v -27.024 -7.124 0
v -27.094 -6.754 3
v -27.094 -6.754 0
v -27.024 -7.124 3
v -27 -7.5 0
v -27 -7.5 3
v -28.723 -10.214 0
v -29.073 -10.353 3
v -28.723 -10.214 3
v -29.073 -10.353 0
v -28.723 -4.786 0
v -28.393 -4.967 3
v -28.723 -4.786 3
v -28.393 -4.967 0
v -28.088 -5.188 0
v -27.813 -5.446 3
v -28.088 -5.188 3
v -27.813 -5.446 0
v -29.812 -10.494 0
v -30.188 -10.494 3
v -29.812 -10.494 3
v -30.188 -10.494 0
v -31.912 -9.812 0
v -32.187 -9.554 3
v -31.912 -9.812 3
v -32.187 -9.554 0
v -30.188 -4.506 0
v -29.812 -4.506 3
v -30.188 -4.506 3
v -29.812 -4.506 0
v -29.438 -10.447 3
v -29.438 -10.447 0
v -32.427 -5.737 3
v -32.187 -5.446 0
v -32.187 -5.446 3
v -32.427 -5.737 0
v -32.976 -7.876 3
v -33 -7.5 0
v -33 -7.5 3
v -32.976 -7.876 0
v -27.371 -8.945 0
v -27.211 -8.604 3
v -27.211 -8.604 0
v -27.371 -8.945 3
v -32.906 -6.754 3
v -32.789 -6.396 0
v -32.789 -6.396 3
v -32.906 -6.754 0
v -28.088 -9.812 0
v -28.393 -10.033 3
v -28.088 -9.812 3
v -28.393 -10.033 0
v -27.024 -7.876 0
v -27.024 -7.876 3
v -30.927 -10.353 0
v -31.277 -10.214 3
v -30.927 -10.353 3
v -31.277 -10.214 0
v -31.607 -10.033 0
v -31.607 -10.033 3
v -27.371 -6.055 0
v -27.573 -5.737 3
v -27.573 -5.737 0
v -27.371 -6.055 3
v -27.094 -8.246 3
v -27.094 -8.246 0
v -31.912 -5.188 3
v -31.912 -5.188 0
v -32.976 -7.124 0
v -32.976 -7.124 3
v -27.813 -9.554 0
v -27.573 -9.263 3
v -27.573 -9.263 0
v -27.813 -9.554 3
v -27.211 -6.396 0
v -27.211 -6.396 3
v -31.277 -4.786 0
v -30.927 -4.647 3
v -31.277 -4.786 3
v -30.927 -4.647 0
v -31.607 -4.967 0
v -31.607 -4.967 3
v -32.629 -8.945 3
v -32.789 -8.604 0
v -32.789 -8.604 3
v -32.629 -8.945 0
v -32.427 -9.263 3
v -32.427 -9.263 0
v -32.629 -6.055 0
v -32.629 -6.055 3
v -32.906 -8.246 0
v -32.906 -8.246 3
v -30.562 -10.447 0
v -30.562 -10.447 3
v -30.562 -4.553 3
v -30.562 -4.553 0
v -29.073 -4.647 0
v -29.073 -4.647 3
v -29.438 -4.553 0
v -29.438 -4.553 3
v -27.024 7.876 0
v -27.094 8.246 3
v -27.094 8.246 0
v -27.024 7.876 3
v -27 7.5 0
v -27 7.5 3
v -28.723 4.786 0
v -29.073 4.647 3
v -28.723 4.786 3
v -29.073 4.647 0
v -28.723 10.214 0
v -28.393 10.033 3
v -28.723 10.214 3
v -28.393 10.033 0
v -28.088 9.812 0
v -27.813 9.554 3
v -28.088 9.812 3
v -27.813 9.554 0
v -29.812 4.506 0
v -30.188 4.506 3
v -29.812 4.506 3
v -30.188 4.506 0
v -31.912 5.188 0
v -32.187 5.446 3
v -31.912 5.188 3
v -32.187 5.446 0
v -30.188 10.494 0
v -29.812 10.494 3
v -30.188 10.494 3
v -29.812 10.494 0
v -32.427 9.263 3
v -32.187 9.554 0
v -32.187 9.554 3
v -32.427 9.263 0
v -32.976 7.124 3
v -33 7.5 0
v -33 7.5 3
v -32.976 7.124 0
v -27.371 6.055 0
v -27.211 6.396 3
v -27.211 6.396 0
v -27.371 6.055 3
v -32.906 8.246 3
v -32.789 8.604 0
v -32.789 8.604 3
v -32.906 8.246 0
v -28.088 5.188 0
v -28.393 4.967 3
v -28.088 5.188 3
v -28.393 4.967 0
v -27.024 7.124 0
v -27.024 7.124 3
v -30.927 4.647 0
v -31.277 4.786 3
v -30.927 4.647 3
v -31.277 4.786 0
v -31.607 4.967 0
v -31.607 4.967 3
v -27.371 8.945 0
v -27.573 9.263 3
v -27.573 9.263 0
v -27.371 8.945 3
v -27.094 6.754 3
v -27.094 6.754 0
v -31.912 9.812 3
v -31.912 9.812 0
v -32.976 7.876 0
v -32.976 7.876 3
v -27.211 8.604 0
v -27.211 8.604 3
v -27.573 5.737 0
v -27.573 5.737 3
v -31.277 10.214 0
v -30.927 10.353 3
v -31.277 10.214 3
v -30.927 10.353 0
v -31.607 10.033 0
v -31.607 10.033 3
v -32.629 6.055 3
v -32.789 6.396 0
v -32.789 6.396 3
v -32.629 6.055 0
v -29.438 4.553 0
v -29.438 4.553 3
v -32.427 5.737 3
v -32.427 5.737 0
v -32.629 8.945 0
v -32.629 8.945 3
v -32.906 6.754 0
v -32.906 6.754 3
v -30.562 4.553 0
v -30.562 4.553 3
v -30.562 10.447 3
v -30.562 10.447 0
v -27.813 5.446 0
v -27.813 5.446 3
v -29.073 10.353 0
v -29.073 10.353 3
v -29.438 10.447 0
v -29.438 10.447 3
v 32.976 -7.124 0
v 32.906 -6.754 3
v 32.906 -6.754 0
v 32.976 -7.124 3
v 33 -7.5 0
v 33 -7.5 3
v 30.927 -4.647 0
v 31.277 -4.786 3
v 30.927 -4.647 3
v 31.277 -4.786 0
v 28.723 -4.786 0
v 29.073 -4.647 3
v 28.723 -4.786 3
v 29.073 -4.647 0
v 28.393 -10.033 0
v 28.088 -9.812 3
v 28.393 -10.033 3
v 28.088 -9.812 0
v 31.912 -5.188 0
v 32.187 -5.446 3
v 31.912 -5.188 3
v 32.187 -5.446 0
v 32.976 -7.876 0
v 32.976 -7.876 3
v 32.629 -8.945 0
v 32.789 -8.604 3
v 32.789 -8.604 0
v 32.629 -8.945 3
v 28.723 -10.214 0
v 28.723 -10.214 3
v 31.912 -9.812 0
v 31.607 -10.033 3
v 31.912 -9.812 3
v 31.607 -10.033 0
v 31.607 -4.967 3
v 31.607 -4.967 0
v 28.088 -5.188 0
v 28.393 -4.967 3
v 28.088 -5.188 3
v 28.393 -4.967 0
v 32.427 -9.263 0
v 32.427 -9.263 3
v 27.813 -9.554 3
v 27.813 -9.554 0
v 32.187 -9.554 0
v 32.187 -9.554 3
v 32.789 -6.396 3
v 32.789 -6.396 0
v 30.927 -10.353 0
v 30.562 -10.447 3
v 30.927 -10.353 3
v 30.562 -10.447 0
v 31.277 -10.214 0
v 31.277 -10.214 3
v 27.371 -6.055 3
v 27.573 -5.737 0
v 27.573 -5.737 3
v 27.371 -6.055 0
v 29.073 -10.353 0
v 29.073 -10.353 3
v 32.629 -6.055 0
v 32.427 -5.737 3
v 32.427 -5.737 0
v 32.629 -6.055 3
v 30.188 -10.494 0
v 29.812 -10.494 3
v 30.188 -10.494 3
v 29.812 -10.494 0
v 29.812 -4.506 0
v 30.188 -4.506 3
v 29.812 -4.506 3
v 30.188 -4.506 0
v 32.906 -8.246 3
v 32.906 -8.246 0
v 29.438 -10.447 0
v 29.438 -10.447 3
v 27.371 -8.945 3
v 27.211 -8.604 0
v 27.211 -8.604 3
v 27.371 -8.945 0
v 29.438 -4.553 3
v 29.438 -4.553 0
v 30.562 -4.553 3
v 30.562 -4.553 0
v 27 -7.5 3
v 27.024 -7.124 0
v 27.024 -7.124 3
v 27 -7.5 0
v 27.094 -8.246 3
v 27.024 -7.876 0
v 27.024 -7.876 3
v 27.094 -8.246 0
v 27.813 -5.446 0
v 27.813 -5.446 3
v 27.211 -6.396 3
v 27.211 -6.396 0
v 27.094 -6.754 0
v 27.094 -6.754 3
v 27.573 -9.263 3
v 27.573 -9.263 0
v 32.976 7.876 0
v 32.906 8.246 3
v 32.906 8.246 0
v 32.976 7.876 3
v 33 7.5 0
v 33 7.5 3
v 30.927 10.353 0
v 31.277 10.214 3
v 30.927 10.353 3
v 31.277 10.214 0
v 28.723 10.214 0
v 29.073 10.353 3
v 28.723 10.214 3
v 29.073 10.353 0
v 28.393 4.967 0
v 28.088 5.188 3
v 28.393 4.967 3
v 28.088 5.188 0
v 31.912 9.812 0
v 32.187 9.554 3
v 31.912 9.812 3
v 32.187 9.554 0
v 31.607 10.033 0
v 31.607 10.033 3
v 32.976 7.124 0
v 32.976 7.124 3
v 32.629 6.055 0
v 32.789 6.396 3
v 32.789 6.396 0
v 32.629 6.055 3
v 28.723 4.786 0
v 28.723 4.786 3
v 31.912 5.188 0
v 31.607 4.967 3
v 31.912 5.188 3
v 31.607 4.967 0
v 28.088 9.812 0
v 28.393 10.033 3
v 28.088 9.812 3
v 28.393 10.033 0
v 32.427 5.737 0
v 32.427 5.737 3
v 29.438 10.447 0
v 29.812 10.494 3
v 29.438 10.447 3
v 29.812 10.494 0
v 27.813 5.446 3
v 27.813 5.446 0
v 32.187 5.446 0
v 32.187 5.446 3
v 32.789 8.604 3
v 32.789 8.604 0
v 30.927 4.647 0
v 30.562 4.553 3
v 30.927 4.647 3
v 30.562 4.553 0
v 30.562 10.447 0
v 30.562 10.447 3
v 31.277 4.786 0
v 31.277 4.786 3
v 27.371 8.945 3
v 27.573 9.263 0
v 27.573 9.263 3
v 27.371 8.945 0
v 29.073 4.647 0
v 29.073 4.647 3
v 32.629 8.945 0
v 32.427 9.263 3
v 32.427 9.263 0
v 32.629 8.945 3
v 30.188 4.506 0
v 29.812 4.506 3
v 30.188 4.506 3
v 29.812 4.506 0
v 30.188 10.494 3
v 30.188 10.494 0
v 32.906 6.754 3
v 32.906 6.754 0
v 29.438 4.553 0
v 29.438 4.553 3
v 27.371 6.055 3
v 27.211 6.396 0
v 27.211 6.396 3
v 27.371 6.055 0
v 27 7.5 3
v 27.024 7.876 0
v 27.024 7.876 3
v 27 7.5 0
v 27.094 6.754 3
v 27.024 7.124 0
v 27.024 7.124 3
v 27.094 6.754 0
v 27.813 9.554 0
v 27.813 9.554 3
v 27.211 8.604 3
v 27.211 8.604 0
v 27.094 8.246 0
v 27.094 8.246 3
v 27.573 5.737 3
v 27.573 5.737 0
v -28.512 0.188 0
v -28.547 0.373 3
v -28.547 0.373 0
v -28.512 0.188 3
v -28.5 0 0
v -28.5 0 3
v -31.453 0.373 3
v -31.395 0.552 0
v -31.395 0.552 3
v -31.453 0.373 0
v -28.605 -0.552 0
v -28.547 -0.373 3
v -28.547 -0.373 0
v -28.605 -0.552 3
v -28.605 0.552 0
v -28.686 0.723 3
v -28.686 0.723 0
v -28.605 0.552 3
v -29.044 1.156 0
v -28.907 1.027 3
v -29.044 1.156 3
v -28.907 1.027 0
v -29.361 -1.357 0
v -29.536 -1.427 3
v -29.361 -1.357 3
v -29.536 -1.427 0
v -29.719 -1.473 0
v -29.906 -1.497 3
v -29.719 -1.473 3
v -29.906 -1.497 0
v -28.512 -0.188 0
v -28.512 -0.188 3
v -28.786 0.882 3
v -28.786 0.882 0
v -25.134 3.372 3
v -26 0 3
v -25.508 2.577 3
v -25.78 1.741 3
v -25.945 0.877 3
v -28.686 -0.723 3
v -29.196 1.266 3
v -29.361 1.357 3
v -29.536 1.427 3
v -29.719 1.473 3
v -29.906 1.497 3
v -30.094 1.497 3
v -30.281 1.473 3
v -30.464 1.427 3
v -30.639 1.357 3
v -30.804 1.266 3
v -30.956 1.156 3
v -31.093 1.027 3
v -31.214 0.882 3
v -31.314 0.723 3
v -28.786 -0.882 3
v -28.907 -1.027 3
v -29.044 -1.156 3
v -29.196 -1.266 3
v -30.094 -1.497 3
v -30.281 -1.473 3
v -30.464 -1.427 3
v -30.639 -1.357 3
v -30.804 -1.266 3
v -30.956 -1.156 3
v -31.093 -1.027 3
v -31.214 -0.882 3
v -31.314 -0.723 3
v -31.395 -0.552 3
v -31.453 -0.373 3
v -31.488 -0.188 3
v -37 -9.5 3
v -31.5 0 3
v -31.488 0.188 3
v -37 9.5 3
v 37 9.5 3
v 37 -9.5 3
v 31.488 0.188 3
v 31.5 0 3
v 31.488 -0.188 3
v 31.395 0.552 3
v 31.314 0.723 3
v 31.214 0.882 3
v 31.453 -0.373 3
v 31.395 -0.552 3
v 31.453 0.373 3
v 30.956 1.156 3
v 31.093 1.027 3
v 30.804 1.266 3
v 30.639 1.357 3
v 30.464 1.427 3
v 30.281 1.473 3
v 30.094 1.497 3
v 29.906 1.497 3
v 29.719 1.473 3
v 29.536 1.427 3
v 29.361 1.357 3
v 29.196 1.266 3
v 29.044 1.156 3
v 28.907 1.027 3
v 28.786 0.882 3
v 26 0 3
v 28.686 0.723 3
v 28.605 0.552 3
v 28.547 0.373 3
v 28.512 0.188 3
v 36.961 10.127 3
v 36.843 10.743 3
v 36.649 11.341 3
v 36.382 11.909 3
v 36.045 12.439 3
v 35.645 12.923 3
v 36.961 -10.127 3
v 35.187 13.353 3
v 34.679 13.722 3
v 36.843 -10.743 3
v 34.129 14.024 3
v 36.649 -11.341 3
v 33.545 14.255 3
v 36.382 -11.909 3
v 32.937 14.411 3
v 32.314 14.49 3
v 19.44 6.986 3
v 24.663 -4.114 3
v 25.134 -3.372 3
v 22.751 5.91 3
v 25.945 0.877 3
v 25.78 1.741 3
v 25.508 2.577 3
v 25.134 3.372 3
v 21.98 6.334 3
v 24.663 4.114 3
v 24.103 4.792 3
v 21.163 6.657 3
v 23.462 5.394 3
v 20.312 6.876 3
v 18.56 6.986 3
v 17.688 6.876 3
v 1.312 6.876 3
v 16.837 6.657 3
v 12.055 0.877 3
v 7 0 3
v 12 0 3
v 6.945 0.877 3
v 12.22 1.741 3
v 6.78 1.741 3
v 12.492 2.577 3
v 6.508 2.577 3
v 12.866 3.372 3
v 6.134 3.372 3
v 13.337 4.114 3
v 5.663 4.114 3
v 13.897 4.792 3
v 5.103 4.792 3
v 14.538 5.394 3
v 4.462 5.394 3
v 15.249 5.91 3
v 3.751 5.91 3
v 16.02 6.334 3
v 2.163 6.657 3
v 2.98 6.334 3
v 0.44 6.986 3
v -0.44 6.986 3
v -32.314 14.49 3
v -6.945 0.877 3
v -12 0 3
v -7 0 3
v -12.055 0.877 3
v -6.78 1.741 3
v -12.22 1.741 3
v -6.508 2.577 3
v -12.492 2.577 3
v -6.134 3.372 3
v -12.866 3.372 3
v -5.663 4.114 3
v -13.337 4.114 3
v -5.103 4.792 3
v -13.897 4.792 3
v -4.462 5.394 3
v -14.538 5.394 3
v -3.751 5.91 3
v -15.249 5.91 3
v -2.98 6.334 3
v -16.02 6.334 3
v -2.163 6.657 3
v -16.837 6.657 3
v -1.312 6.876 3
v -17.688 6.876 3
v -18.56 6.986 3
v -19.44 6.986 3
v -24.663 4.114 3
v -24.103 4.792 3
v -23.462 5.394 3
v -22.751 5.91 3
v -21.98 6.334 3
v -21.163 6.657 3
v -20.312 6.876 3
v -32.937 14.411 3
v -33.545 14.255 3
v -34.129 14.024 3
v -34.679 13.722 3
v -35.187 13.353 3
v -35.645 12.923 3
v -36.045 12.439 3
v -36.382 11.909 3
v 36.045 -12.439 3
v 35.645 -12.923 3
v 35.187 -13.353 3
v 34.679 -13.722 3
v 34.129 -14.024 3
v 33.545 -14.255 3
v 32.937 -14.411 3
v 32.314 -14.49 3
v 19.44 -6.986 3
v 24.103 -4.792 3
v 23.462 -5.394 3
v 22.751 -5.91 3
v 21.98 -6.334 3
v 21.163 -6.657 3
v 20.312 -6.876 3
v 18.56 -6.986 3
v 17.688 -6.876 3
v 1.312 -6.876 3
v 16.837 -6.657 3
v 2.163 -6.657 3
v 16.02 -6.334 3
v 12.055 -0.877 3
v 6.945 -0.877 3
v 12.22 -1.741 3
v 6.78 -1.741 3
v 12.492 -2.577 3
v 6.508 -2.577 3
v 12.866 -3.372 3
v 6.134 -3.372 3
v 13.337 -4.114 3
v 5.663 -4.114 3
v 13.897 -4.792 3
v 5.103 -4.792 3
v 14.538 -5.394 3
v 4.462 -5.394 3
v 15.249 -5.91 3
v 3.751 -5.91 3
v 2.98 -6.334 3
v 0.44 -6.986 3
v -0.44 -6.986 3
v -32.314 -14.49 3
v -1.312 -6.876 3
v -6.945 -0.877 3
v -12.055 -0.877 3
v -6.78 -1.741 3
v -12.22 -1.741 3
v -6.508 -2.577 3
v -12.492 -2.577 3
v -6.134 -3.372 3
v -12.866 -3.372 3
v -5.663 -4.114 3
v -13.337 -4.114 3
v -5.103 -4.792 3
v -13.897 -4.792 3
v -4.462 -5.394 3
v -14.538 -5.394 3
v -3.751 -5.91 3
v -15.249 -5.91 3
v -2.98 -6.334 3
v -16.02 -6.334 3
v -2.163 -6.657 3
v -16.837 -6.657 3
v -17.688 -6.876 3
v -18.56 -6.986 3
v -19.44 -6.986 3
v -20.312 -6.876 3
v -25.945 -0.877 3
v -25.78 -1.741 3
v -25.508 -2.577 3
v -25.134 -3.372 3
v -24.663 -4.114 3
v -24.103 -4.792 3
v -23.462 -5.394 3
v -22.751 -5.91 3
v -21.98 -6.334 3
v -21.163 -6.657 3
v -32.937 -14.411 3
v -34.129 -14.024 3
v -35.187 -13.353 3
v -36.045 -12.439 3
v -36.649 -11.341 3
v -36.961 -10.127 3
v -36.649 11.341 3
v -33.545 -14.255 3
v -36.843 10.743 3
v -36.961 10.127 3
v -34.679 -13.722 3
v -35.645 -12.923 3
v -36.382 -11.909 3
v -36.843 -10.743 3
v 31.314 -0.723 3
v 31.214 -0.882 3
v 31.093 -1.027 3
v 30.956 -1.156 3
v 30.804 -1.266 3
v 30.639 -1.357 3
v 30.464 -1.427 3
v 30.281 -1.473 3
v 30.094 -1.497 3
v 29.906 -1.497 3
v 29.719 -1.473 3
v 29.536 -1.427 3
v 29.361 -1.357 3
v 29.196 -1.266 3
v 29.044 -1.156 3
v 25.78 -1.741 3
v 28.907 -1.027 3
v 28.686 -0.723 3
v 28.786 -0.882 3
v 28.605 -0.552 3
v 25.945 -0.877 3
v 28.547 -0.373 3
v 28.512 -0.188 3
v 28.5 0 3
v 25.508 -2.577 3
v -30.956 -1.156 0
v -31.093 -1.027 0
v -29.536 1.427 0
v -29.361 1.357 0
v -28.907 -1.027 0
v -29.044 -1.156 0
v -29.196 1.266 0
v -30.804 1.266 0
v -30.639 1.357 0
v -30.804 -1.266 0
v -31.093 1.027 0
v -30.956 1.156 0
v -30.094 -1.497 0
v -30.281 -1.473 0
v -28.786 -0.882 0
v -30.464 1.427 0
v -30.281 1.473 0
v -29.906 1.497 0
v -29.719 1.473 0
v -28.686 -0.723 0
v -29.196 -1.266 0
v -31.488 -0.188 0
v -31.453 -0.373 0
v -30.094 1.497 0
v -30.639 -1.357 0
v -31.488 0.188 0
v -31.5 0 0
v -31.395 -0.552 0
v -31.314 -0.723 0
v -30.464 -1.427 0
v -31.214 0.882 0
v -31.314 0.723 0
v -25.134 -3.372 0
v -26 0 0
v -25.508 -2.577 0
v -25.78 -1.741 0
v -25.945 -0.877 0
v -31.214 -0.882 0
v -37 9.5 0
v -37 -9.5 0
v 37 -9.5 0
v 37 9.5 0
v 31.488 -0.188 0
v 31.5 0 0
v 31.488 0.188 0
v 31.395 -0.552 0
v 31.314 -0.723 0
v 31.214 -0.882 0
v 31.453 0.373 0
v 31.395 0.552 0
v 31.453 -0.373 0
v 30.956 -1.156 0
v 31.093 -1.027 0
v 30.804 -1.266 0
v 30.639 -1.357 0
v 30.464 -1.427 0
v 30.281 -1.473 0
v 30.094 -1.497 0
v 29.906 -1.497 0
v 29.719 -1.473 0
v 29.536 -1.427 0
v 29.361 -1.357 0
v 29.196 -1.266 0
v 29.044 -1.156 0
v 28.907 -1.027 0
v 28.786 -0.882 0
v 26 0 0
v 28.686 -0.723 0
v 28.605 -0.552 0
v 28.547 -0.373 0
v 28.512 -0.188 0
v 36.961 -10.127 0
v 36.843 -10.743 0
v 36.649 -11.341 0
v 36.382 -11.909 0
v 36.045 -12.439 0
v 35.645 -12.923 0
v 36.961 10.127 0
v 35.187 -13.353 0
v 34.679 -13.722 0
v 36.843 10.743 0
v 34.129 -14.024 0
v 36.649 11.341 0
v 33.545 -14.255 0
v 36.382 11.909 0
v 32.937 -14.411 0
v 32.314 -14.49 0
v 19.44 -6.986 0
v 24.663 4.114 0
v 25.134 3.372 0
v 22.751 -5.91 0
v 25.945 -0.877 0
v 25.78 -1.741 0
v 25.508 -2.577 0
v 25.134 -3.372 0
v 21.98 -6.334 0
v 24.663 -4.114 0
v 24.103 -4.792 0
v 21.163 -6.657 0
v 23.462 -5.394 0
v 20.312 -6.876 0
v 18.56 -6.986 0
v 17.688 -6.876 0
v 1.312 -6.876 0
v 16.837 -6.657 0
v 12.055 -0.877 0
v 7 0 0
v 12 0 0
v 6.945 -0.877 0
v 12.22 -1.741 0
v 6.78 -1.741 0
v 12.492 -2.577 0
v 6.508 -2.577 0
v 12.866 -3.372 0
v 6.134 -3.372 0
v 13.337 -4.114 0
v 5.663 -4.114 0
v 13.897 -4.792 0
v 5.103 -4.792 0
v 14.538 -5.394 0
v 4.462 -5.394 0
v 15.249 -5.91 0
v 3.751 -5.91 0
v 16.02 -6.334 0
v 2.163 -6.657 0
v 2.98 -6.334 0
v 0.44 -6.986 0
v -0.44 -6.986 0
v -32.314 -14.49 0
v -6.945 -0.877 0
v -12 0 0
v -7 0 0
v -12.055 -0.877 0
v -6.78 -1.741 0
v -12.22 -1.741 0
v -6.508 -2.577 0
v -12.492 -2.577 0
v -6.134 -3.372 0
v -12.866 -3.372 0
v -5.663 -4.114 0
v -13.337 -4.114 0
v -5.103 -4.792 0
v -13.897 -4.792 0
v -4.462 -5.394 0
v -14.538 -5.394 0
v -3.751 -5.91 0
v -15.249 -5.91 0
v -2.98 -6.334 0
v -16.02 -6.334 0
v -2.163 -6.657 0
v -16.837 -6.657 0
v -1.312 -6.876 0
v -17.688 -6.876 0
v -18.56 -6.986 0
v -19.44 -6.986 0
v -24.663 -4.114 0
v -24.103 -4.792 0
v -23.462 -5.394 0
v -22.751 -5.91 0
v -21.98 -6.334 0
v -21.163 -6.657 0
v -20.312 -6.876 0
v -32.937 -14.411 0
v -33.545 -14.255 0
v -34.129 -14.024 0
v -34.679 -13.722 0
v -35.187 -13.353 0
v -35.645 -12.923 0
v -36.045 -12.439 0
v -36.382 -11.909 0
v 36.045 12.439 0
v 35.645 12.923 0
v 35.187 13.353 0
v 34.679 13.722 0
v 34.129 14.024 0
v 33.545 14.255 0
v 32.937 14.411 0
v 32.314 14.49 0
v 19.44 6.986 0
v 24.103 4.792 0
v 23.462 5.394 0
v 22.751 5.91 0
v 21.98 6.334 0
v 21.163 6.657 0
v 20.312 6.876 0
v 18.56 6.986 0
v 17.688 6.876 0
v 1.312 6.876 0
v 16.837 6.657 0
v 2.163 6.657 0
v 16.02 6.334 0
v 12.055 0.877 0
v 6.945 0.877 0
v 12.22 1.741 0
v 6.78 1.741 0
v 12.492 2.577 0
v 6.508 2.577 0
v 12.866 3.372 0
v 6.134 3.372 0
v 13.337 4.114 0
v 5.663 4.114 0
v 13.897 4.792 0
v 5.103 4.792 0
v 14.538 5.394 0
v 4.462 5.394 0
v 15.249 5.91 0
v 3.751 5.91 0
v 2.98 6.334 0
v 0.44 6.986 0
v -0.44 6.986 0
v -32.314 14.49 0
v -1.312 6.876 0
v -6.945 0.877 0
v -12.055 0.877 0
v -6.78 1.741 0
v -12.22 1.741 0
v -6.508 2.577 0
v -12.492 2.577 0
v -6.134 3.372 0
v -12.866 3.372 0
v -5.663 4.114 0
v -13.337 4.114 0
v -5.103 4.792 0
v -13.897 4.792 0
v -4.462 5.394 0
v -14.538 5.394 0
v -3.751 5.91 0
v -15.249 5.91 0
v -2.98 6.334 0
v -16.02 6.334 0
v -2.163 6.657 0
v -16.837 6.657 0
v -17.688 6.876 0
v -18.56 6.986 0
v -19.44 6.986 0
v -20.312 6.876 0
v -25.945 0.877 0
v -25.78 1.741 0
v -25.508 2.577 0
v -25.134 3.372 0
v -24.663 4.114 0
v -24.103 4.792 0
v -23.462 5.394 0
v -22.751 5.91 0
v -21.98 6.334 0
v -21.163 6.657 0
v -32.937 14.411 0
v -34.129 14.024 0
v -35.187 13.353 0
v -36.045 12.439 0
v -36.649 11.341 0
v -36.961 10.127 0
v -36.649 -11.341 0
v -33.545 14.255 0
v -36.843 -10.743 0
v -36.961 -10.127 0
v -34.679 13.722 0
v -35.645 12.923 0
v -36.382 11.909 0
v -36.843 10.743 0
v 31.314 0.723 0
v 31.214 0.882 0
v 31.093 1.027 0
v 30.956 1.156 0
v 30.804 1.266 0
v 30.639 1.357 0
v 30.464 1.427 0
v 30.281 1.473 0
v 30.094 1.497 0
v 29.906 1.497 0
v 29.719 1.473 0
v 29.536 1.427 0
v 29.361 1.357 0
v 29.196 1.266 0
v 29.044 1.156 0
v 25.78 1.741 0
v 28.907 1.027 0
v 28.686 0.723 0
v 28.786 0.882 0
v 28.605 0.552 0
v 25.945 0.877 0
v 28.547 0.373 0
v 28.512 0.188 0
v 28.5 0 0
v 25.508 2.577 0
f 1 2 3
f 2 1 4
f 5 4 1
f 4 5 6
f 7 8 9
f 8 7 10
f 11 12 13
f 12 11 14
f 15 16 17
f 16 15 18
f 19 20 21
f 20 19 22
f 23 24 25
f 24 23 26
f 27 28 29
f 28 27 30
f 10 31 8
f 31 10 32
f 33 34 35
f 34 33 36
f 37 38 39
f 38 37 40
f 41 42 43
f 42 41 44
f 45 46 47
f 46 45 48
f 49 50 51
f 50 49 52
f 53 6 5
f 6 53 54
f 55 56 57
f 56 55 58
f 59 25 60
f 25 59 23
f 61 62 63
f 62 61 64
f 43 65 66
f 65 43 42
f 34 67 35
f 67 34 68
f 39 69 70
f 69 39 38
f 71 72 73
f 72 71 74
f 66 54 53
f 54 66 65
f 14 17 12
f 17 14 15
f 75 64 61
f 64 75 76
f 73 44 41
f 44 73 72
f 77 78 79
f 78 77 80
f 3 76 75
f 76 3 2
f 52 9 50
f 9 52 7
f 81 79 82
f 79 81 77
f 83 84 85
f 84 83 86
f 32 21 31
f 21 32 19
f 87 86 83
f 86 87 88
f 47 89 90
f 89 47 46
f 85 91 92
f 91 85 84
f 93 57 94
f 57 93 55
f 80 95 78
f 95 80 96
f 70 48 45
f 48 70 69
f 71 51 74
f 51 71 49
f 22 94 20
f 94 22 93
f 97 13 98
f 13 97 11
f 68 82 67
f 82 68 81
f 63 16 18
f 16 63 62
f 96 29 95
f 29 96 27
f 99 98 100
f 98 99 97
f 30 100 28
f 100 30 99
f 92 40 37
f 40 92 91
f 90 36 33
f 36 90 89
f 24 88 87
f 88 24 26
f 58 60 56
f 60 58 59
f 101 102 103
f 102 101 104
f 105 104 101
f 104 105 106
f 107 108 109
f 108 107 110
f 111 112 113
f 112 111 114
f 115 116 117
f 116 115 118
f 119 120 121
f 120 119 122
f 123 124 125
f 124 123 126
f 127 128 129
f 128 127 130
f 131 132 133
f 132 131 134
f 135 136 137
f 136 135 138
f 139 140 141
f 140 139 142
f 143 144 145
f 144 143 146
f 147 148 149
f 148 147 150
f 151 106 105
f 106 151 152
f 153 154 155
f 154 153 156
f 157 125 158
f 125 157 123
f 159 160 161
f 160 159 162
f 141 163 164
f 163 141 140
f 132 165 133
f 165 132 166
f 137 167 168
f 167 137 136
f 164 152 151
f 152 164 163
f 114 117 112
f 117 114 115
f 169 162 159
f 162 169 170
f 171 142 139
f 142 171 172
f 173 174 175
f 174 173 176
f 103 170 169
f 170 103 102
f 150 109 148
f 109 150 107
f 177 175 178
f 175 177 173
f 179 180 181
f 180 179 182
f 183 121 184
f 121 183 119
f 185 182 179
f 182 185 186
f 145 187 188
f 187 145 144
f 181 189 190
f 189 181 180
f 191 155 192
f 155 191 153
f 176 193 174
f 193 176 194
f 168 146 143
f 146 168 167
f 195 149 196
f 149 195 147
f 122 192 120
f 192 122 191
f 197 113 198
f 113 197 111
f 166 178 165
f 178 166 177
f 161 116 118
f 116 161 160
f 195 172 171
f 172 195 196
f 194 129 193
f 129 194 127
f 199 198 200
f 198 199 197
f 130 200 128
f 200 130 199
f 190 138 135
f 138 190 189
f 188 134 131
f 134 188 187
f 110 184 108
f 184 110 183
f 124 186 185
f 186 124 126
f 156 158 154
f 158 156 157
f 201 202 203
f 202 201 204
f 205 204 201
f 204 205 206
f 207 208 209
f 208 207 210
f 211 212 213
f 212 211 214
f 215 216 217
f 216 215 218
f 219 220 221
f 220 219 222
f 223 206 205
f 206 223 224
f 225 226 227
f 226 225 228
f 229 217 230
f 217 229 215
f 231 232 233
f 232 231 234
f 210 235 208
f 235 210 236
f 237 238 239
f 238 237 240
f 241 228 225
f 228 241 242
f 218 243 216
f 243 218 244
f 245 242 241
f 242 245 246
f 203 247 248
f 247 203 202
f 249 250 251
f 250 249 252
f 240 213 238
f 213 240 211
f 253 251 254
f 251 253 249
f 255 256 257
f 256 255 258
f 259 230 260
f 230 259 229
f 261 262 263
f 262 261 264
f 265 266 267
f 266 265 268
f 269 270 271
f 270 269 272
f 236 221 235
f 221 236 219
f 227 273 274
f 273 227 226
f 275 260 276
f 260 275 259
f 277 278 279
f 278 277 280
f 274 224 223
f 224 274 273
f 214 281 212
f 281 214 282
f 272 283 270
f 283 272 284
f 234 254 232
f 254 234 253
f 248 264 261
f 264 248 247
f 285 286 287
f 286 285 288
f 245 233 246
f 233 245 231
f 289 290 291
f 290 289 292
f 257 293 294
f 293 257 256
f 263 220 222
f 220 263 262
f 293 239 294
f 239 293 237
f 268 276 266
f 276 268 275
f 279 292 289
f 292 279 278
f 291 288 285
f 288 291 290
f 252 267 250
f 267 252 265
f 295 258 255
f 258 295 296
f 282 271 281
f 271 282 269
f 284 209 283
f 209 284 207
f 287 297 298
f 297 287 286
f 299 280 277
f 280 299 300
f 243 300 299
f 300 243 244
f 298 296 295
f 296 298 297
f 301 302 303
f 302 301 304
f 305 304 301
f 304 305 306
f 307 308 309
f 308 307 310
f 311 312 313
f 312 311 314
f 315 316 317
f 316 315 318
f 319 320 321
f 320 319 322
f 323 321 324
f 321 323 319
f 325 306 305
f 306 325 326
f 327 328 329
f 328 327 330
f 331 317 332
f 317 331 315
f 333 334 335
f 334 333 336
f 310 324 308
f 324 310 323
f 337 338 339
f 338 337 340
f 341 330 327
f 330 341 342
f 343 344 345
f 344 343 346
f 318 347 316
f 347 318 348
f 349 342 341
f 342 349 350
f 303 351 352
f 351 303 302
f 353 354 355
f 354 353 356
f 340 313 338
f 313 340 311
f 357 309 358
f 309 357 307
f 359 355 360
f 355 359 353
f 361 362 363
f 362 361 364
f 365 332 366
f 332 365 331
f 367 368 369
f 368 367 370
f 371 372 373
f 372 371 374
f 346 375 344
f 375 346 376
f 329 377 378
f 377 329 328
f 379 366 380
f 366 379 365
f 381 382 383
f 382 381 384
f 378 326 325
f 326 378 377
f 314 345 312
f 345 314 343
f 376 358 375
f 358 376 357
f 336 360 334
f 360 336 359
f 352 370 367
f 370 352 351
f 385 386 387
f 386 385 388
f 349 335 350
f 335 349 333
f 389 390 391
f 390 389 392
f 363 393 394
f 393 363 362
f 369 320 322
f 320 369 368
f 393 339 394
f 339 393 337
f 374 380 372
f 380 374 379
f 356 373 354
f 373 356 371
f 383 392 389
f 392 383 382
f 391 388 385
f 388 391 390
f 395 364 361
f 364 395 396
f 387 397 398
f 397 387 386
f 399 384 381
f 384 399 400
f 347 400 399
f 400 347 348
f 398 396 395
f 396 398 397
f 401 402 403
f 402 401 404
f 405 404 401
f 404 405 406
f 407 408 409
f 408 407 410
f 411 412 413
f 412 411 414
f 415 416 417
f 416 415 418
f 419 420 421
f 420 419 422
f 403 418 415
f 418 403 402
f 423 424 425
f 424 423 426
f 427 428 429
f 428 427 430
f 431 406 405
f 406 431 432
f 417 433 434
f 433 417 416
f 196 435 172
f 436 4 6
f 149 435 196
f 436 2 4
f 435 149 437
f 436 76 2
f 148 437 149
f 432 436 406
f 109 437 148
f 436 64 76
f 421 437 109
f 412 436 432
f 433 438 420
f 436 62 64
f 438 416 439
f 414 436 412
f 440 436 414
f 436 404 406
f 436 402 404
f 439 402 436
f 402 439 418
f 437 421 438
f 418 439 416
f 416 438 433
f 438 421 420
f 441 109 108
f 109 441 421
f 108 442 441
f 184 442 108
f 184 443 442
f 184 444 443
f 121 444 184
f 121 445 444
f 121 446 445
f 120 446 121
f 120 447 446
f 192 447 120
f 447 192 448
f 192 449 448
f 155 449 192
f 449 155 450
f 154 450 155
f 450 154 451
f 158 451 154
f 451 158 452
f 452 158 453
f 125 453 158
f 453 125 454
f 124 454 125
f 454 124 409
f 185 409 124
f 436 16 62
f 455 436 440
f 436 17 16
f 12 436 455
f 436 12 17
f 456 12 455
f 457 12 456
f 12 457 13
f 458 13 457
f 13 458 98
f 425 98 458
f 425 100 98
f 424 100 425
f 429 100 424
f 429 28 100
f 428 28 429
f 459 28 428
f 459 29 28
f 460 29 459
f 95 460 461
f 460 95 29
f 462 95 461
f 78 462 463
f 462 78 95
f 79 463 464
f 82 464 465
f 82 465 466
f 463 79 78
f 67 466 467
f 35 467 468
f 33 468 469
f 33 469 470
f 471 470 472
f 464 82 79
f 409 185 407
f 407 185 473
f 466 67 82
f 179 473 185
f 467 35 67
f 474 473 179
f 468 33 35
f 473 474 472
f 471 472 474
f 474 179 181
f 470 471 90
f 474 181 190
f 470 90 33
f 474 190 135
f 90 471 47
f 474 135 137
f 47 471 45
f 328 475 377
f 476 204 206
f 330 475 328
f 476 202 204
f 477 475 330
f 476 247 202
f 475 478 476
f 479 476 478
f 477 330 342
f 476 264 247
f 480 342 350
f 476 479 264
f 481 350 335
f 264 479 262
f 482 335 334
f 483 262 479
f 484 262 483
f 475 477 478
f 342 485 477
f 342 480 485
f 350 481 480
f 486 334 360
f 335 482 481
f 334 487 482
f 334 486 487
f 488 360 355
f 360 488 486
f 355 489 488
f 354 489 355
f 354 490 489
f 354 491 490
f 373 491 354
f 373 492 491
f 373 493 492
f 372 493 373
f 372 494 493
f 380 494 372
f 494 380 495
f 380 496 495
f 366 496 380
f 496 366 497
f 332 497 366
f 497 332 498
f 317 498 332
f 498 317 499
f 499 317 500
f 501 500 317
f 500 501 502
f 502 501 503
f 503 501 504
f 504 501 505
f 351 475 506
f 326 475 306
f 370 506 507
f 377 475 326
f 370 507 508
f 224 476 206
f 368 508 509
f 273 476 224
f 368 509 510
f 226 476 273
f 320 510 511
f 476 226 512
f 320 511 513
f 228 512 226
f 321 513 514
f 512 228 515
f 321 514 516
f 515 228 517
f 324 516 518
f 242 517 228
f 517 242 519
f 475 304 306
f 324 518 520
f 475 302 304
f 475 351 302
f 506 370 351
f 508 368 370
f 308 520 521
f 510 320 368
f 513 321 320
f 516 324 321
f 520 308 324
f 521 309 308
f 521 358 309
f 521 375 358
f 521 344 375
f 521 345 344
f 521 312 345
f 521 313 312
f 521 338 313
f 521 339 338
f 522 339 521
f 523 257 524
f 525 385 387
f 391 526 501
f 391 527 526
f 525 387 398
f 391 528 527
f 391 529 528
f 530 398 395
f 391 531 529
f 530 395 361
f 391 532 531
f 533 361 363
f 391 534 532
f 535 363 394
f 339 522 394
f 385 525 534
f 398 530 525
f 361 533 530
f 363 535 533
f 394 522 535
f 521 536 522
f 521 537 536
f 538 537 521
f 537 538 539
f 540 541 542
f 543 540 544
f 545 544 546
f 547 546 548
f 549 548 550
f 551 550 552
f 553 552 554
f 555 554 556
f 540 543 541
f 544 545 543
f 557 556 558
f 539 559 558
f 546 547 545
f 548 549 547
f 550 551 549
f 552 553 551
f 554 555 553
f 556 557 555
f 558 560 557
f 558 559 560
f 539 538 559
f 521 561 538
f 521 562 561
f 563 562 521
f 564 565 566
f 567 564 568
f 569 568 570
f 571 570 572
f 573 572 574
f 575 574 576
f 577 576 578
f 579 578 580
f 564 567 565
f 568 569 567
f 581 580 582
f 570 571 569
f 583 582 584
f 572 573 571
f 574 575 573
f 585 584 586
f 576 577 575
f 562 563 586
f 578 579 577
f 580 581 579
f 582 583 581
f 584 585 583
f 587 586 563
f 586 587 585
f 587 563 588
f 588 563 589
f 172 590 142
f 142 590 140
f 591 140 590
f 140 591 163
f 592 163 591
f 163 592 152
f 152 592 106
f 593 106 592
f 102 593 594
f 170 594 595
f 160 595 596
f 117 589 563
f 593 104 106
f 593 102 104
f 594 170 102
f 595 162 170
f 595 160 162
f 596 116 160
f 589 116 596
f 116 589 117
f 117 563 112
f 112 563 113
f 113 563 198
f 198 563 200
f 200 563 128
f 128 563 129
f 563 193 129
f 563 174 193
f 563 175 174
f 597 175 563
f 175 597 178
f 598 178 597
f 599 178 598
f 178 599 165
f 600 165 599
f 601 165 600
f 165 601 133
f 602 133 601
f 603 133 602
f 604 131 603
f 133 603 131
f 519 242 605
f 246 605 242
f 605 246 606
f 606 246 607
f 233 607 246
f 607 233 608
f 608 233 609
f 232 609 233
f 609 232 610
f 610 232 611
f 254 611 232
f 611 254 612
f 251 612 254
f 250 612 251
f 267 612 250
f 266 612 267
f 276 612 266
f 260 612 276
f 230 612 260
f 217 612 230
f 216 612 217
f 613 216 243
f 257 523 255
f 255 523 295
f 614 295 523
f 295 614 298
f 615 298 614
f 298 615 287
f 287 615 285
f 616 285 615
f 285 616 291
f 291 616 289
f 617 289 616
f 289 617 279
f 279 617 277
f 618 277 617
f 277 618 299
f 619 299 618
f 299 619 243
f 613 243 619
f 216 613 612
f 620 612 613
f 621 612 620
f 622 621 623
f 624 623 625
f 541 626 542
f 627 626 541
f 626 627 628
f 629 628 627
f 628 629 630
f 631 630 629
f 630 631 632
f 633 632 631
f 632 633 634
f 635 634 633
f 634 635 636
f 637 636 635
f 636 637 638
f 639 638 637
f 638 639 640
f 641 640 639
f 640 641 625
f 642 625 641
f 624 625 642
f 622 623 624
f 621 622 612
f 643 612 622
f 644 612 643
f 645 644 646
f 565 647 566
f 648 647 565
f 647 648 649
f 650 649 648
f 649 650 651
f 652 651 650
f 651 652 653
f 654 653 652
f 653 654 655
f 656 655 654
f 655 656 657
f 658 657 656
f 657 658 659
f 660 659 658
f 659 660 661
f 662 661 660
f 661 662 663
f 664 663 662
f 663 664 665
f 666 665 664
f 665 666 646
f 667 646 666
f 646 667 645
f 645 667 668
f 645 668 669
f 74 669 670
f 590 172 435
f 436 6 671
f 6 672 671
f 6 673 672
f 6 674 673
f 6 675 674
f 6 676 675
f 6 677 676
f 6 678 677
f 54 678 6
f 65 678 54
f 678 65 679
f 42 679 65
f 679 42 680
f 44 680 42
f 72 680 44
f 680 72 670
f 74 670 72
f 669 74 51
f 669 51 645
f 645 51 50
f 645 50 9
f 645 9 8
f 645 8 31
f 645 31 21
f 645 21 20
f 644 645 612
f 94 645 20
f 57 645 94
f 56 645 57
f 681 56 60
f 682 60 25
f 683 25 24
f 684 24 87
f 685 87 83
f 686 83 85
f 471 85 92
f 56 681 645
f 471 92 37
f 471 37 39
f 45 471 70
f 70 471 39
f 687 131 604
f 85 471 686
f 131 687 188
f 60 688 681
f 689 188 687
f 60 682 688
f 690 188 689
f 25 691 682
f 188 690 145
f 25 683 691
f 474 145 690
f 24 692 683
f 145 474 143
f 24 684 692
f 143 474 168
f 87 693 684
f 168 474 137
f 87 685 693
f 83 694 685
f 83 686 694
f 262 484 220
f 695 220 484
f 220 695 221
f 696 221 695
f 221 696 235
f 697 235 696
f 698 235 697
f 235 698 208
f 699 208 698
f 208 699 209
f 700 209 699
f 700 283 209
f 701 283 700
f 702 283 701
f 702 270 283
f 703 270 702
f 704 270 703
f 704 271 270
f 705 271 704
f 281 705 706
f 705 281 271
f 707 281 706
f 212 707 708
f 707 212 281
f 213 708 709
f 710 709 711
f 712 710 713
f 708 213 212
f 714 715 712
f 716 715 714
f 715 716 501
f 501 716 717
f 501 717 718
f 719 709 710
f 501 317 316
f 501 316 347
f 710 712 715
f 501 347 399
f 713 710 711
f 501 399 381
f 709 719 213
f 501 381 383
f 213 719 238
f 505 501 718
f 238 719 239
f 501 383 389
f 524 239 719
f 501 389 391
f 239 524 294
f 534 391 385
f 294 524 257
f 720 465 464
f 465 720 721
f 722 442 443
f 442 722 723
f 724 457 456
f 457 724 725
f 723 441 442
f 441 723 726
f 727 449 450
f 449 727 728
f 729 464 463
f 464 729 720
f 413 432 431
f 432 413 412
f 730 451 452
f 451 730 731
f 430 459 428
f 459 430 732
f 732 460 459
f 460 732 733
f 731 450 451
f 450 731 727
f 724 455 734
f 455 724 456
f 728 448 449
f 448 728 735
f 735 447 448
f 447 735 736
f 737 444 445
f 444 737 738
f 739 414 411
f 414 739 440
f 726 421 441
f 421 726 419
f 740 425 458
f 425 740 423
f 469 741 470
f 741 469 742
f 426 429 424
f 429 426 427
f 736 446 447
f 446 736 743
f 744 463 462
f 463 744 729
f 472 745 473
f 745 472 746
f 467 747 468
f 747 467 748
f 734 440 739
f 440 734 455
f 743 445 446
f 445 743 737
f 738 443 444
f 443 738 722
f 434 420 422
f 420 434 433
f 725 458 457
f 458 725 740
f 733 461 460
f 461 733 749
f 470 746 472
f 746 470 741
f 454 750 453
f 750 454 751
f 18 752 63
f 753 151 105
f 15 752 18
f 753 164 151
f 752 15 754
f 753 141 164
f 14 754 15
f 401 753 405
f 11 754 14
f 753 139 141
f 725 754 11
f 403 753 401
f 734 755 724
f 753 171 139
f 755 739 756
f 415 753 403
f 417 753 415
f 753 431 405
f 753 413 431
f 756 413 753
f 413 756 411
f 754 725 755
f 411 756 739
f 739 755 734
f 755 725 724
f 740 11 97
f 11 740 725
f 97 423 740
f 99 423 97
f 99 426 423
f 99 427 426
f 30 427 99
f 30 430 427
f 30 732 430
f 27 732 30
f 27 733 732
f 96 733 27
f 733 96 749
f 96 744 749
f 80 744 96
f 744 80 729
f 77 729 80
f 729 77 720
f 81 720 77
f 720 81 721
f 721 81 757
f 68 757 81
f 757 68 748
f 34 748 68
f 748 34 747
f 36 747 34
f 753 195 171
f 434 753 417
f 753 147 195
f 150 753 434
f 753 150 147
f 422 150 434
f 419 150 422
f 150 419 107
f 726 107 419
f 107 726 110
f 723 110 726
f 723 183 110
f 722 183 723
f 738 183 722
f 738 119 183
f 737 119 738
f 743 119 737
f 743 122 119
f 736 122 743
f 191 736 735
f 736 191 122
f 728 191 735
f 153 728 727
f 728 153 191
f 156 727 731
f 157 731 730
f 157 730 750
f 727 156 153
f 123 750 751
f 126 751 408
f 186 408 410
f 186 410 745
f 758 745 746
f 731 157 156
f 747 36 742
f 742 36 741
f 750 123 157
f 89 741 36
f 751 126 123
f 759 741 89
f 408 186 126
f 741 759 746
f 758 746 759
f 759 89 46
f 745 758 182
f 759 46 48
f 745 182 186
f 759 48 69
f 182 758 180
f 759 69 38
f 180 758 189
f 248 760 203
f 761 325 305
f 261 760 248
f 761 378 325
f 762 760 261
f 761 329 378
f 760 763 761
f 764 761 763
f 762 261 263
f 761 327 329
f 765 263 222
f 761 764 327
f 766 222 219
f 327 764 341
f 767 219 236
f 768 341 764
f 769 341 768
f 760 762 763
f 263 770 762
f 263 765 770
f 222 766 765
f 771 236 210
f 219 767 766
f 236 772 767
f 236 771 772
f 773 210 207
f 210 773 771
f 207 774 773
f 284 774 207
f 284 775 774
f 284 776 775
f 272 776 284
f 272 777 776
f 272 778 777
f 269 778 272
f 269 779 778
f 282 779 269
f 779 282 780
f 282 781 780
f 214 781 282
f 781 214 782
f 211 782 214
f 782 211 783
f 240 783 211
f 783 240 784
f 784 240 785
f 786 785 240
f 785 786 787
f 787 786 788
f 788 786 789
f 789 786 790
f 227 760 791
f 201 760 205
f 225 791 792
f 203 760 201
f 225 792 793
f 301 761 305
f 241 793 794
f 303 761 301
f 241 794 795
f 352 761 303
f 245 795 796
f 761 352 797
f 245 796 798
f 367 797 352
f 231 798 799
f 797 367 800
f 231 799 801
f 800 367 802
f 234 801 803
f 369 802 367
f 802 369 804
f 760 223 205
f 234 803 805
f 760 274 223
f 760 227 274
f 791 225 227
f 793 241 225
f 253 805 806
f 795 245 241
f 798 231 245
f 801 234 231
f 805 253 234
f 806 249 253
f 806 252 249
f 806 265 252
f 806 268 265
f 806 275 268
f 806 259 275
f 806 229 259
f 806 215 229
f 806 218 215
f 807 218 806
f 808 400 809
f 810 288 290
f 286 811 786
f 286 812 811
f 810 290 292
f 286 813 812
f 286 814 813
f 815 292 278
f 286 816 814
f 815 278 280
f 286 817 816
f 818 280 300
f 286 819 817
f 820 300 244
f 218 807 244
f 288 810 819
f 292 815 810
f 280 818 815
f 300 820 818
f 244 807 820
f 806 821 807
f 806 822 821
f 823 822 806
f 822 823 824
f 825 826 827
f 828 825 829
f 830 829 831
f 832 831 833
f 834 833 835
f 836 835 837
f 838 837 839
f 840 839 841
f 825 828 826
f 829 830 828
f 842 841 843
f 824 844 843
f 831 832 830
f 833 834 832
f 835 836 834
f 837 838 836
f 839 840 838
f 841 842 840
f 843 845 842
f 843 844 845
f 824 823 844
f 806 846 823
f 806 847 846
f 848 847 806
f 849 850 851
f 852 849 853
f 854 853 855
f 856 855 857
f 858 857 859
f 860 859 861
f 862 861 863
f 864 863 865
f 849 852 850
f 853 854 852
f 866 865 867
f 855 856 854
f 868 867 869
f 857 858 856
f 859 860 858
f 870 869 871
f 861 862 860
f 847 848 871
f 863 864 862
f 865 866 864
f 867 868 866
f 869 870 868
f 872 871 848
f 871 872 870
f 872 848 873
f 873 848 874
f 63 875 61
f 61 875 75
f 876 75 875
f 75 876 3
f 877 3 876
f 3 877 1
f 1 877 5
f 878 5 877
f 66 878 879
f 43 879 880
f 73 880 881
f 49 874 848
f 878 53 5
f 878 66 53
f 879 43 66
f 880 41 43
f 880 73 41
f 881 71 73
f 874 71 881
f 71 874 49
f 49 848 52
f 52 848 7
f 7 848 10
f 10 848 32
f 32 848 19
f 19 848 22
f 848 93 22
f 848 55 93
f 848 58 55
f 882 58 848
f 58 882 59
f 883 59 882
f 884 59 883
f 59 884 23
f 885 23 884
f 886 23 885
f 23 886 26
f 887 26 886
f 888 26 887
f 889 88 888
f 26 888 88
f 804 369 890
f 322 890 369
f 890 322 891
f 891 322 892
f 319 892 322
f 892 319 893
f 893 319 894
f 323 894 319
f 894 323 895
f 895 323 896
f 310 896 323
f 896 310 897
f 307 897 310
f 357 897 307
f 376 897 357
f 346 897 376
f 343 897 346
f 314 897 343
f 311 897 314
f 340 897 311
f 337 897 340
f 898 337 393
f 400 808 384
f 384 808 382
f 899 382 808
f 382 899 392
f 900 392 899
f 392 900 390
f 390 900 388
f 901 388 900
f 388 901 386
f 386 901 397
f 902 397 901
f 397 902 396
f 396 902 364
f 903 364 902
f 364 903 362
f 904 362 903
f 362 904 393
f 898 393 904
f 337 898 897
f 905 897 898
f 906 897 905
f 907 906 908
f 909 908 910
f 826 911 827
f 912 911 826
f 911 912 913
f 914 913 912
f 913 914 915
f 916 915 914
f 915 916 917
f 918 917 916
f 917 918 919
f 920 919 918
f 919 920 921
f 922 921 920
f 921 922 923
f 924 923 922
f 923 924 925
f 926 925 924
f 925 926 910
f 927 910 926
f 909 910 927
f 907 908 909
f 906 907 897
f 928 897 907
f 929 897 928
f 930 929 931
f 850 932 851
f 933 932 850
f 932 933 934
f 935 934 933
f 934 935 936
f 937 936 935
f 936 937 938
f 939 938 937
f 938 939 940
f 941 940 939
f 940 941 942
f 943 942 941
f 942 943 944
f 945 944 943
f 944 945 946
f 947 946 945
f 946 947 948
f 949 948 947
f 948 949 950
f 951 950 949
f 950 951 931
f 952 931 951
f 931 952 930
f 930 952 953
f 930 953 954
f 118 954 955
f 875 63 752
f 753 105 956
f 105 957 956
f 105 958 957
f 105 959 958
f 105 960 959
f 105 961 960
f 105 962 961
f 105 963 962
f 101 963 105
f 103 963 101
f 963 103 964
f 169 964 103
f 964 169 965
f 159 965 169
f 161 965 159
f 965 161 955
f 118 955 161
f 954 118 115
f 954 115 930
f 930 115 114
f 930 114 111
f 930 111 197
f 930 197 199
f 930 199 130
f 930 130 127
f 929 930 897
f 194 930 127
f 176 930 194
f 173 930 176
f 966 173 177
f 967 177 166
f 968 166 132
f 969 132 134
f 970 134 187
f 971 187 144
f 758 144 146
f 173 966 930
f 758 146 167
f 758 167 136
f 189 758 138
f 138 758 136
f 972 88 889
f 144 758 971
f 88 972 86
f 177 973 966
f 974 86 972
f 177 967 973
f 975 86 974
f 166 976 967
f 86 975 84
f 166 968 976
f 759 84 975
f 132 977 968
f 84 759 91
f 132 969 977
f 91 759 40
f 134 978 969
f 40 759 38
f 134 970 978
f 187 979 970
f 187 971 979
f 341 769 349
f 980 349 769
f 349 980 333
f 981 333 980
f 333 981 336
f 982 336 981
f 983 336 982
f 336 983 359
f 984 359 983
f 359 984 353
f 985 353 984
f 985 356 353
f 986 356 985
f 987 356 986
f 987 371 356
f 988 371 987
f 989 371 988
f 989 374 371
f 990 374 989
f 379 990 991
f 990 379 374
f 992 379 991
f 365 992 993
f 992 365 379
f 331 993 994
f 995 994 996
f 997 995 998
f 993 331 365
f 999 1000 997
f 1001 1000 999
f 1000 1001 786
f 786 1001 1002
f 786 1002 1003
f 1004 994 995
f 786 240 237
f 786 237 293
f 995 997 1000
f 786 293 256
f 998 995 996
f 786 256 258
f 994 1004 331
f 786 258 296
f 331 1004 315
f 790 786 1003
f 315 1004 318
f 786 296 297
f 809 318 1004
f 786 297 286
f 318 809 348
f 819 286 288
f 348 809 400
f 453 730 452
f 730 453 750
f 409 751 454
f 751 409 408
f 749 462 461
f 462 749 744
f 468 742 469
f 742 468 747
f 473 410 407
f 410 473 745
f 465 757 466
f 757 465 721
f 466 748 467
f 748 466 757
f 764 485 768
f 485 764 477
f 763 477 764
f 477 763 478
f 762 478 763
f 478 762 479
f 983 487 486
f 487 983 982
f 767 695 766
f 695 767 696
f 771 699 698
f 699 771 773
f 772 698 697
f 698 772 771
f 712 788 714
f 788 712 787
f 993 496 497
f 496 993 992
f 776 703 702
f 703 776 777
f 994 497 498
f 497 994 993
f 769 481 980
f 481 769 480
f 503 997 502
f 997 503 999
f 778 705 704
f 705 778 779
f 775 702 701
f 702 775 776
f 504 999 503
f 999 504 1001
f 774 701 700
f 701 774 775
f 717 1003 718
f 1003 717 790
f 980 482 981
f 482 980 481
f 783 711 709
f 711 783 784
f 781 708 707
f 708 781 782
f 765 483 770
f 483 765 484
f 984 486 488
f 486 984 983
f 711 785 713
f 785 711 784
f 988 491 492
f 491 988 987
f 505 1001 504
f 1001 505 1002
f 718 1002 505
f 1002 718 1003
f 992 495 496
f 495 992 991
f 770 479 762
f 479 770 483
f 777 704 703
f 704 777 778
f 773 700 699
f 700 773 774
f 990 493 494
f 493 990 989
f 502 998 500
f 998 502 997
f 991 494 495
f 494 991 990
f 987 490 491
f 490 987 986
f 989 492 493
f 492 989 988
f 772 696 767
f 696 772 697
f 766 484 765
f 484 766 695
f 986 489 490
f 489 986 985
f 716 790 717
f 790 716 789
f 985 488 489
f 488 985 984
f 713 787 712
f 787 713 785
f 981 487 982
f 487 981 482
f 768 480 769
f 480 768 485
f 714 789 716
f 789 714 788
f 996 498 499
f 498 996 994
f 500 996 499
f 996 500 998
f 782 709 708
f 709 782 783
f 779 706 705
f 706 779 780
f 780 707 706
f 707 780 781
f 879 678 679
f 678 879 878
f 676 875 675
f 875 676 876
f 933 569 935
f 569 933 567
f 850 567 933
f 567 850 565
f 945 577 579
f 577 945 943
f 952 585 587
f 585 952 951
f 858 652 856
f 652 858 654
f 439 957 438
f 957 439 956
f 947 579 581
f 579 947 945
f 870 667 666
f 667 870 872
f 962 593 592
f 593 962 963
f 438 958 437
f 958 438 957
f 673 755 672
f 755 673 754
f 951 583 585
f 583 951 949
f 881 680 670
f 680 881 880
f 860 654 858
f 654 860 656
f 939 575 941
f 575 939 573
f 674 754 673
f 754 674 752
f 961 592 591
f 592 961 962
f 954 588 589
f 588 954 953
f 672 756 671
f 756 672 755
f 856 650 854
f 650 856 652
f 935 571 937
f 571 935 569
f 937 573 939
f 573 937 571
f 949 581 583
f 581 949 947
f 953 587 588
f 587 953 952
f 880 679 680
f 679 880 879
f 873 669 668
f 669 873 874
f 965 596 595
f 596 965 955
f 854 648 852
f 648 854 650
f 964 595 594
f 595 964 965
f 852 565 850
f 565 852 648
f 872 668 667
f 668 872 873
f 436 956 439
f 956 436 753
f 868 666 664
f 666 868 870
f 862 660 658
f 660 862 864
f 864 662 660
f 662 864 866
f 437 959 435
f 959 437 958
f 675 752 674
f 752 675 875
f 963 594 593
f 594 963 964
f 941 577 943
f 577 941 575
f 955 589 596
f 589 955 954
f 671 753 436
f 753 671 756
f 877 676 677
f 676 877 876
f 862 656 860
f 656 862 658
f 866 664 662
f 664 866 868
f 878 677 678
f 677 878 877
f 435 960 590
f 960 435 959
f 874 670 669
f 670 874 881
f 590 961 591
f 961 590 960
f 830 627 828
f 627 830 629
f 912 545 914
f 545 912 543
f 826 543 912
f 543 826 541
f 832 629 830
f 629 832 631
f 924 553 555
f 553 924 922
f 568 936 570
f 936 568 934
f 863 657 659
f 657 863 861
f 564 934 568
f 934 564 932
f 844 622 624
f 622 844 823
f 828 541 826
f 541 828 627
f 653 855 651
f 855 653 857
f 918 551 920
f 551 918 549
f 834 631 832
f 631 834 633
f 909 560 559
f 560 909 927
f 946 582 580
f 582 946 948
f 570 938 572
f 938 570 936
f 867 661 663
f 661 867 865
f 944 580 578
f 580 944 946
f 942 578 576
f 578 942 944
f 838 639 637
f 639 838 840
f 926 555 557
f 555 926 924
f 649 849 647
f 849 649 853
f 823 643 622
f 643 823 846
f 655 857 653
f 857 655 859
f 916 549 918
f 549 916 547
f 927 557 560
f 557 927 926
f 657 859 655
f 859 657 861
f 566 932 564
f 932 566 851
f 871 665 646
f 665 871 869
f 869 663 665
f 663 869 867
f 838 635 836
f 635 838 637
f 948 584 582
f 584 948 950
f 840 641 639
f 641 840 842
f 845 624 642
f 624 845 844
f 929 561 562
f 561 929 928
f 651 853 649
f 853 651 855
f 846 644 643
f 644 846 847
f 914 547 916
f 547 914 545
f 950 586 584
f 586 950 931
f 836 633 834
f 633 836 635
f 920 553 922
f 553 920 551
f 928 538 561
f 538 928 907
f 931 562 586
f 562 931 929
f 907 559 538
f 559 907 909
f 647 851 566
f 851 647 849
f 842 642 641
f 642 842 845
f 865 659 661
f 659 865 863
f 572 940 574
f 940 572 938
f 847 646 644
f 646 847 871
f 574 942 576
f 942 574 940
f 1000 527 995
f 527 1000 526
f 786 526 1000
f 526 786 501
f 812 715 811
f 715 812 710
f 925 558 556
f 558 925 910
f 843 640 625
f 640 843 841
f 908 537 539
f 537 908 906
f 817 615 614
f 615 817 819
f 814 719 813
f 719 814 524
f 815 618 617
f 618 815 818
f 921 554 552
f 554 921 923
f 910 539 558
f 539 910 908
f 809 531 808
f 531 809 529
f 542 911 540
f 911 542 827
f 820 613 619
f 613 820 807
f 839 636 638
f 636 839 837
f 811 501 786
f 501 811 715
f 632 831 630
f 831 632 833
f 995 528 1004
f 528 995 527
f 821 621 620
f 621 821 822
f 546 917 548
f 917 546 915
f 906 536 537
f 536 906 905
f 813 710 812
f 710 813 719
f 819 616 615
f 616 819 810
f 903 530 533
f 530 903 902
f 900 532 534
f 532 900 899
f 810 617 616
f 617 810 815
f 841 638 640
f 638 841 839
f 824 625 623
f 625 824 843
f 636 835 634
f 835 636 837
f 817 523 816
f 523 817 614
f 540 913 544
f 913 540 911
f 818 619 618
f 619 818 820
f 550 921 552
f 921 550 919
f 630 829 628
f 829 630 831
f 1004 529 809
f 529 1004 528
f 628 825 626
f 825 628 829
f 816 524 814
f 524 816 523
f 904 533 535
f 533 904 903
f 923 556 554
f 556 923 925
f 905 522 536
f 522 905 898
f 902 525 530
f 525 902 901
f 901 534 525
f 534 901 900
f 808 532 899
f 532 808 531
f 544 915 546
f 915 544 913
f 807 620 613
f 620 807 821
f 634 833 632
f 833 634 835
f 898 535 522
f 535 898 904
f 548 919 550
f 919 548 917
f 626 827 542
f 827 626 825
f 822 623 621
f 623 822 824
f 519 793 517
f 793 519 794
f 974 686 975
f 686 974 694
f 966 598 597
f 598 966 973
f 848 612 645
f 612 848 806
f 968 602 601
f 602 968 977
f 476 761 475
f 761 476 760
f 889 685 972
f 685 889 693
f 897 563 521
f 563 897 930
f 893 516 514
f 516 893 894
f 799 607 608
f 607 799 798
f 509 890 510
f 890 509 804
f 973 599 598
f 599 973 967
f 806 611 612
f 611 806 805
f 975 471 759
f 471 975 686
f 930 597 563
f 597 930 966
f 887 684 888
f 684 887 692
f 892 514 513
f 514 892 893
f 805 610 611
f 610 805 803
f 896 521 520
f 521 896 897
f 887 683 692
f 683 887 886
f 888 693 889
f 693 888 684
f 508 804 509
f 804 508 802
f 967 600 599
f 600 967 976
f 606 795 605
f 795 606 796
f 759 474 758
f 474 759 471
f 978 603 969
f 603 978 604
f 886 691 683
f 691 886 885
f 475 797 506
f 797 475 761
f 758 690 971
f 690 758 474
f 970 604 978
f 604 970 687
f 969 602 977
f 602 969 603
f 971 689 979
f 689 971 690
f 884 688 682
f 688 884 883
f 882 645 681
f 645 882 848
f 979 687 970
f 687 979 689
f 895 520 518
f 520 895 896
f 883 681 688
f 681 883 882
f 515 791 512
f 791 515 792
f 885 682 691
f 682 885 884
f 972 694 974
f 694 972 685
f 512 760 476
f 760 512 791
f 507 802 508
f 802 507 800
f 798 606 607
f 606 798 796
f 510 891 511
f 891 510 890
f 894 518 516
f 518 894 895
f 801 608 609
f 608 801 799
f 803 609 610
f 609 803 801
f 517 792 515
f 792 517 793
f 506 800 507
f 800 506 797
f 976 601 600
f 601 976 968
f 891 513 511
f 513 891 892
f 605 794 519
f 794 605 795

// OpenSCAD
$fn = 50;


difference() {
	union() {
		hull() {
			translate(v = [-32.0000000000, 9.5000000000, 0]) {
				cylinder(h = 3, r = 5);
			}
			translate(v = [32.0000000000, 9.5000000000, 0]) {
				cylinder(h = 3, r = 5);
			}
			translate(v = [-32.0000000000, -9.5000000000, 0]) {
				cylinder(h = 3, r = 5);
			}
			translate(v = [32.0000000000, -9.5000000000, 0]) {
				cylinder(h = 3, r = 5);
			}
		}
	}
	union() {
		#translate(v = [-30.0000000000, -7.5000000000, 0]) {
			cylinder(h = 3, r = 3.0000000000);
		}
		#translate(v = [-30.0000000000, 7.5000000000, 0]) {
			cylinder(h = 3, r = 3.0000000000);
		}
		#translate(v = [30.0000000000, -7.5000000000, 0]) {
			cylinder(h = 3, r = 3.0000000000);
		}
		#translate(v = [30.0000000000, 7.5000000000, 0]) {
			cylinder(h = 3, r = 3.0000000000);
		}
		#translate(v = [-30.0000000000, -7.5000000000, -100.0000000000]) {
			cylinder(h = 200, r = 3.0000000000);
		}
		#translate(v = [-30.0000000000, 7.5000000000, -100.0000000000]) {
			cylinder(h = 200, r = 3.0000000000);
		}
		#translate(v = [30.0000000000, -7.5000000000, -100.0000000000]) {
			cylinder(h = 200, r = 3.0000000000);
		}
		#translate(v = [30.0000000000, 7.5000000000, -100.0000000000]) {
			cylinder(h = 200, r = 3.0000000000);
		}
		#translate(v = [-30.0000000000, -7.5000000000, 0]) {
			cylinder(h = 3, r = 1.5000000000);
		}
		#translate(v = [-30.0000000000, 0.0000000000, 0]) {
			cylinder(h = 3, r = 1.5000000000);
		}
		#translate(v = [-30.0000000000, 7.5000000000, 0]) {
			cylinder(h = 3, r = 1.5000000000);
		}
		#translate(v = [30.0000000000, -7.5000000000, 0]) {
			cylinder(h = 3, r = 1.5000000000);
		}
		#translate(v = [30.0000000000, 0.0000000000, 0]) {
			cylinder(h = 3, r = 1.5000000000);
		}
		#translate(v = [30.0000000000, 7.5000000000, 0]) {
			cylinder(h = 3, r = 1.5000000000);
		}
		#translate(v = [-30.0000000000, -7.5000000000, 0]) {
			cylinder(h = 3, r = 1.5000000000);
		}
		#translate(v = [-30.0000000000, 0.0000000000, 0]) {
			cylinder(h = 3, r = 1.5000000000);
		}
		#translate(v = [-30.0000000000, 7.5000000000, 0]) {
			cylinder(h = 3, r = 1.5000000000);
		}
		#translate(v = [30.0000000000, -7.5000000000, 0]) {
			cylinder(h = 3, r = 1.5000000000);
		}
		#translate(v = [30.0000000000, 0.0000000000, 0]) {
			cylinder(h = 3, r = 1.5000000000);
		}
		#translate(v = [30.0000000000, 7.5000000000, 0]) {
			cylinder(h = 3, r = 1.5000000000);
		}
		#translate(v = [-30.0000000000, -7.5000000000, 0]) {
			cylinder(h = 3, r = 1.5000000000);
		}
		#translate(v = [-30.0000000000, 0.0000000000, 0]) {
			cylinder(h = 3, r = 1.5000000000);
		}
		#translate(v = [-30.0000000000, 7.5000000000, 0]) {
			cylinder(h = 3, r = 1.5000000000);
		}
		#translate(v = [30.0000000000, -7.5000000000, 0]) {
			cylinder(h = 3, r = 1.5000000000);
		}
		#translate(v = [30.0000000000, 0.0000000000, 0]) {
			cylinder(h = 3, r = 1.5000000000);
		}
		#translate(v = [30.0000000000, 7.5000000000, 0]) {
			cylinder(h = 3, r = 1.5000000000);
		}
		#translate(v = [-19.0000000000, 0, 0]) {
			cylinder(h = 3, r = 7.0000000000);
		}
		#cylinder(h = 3, r = 7.0000000000);
		#translate(v = [19.0000000000, 0, 0]) {
			cylinder(h = 3, r = 7.0000000000);
		}
	}
}
